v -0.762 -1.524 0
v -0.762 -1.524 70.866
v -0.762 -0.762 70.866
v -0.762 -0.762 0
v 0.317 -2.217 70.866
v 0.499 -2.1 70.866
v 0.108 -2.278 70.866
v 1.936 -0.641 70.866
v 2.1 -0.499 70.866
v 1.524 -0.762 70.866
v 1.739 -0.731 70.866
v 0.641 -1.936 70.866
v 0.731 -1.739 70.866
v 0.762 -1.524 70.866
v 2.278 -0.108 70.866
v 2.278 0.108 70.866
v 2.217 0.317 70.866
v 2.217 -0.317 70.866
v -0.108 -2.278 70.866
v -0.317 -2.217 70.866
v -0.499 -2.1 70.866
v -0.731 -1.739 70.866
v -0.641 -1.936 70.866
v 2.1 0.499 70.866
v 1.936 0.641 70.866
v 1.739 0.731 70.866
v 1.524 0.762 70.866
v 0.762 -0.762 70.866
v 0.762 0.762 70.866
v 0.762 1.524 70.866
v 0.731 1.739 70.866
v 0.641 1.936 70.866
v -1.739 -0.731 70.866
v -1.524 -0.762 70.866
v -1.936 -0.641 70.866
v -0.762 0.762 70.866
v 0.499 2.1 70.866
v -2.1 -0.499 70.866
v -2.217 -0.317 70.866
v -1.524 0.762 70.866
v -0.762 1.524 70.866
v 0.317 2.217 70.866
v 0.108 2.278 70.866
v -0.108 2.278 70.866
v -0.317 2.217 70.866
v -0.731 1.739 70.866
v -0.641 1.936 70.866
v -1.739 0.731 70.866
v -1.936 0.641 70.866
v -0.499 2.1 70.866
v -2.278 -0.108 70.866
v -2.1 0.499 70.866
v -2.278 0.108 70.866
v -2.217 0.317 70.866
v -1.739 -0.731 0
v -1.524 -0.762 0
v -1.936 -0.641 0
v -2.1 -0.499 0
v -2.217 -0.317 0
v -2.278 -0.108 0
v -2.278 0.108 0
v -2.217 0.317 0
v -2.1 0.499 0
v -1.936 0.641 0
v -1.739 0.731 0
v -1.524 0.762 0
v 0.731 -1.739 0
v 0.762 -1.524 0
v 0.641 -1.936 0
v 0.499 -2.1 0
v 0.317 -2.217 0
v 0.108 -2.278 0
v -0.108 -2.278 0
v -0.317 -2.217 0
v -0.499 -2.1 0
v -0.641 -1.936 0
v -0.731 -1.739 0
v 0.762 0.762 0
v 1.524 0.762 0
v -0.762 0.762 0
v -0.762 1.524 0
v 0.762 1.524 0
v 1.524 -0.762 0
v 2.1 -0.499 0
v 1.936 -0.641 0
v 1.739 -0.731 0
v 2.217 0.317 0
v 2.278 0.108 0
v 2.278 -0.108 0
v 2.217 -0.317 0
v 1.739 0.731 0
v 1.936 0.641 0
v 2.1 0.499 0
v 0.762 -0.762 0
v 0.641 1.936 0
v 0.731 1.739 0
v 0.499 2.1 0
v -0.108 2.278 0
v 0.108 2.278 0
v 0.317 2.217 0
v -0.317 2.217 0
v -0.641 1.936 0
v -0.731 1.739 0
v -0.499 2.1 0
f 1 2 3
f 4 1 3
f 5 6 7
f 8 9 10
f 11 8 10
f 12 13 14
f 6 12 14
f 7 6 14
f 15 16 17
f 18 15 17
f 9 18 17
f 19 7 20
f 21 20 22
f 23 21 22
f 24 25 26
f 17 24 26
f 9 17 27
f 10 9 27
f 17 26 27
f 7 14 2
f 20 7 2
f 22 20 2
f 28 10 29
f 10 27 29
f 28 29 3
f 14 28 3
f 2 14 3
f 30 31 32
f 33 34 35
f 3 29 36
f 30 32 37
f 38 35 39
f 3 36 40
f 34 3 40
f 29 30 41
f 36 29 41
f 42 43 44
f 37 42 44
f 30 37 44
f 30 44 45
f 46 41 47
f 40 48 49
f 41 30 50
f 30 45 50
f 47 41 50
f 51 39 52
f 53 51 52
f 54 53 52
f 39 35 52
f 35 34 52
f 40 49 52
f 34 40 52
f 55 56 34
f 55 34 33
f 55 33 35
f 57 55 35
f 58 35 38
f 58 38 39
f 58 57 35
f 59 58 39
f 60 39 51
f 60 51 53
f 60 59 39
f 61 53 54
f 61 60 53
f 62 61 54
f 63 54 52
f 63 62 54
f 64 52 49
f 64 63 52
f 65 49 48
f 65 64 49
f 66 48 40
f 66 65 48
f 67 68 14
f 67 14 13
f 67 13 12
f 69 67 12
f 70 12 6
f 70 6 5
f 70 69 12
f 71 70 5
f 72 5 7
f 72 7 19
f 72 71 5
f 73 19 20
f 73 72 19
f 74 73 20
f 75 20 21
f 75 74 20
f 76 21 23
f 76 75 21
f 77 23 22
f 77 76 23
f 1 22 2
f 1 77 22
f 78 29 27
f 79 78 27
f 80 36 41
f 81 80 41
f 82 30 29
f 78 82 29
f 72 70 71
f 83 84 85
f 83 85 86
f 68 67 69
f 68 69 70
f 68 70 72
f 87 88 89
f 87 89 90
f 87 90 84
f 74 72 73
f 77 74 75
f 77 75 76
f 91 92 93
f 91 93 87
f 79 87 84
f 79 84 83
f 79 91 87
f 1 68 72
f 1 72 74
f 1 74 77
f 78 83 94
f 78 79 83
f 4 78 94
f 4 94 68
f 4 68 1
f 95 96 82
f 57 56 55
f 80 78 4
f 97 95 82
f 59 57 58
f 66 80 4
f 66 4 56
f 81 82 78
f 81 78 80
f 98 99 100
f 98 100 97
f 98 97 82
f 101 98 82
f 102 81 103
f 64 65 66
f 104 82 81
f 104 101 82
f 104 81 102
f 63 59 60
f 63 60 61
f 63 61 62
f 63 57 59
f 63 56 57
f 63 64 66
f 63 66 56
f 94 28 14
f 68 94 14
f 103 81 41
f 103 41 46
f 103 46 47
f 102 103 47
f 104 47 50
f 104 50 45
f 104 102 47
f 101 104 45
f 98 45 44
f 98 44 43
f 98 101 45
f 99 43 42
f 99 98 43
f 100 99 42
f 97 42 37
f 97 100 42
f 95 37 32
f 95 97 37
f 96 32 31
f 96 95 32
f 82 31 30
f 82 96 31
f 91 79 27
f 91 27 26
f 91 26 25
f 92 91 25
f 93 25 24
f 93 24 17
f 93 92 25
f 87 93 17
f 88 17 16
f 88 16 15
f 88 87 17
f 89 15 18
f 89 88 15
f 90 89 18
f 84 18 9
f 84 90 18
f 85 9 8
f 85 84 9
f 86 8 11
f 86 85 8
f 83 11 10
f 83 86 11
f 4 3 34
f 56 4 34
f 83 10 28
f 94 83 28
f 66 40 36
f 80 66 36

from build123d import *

# Parameters (mm, degrees)
BOSS_EXTRUDE1_DEPTH = 70.866


with BuildPart() as part:
    # Sketch1 → Boss-Extrude1 (new body)
    with BuildSketch(Plane.XY):
        with BuildLine():
            Line((-0.762, 0.762), (-1.524, 0.762))
            ThreePointArc((-1.524, 0.762), (-2.286, 0), (-1.524, -0.762))
            Line((-1.524, -0.762), (-0.762, -0.762))
            Line((-0.762, -0.762), (-0.762, -1.524))
            ThreePointArc((-0.762, -1.524), (0, -2.286), (0.762, -1.524))
            Line((0.762, -1.524), (0.762, -0.762))
            Line((0.762, -0.762), (1.524, -0.762))
            ThreePointArc((1.524, -0.762), (2.286, 0), (1.524, 0.762))
            Line((1.524, 0.762), (0.762, 0.762))
            Line((0.762, 0.762), (0.762, 1.524))
            ThreePointArc((0.762, 1.524), (0, 2.286), (-0.762, 1.524))
            Line((-0.762, 1.524), (-0.762, 0.762))
        make_face()
    extrude(amount=BOSS_EXTRUDE1_DEPTH)


solid = part.part
